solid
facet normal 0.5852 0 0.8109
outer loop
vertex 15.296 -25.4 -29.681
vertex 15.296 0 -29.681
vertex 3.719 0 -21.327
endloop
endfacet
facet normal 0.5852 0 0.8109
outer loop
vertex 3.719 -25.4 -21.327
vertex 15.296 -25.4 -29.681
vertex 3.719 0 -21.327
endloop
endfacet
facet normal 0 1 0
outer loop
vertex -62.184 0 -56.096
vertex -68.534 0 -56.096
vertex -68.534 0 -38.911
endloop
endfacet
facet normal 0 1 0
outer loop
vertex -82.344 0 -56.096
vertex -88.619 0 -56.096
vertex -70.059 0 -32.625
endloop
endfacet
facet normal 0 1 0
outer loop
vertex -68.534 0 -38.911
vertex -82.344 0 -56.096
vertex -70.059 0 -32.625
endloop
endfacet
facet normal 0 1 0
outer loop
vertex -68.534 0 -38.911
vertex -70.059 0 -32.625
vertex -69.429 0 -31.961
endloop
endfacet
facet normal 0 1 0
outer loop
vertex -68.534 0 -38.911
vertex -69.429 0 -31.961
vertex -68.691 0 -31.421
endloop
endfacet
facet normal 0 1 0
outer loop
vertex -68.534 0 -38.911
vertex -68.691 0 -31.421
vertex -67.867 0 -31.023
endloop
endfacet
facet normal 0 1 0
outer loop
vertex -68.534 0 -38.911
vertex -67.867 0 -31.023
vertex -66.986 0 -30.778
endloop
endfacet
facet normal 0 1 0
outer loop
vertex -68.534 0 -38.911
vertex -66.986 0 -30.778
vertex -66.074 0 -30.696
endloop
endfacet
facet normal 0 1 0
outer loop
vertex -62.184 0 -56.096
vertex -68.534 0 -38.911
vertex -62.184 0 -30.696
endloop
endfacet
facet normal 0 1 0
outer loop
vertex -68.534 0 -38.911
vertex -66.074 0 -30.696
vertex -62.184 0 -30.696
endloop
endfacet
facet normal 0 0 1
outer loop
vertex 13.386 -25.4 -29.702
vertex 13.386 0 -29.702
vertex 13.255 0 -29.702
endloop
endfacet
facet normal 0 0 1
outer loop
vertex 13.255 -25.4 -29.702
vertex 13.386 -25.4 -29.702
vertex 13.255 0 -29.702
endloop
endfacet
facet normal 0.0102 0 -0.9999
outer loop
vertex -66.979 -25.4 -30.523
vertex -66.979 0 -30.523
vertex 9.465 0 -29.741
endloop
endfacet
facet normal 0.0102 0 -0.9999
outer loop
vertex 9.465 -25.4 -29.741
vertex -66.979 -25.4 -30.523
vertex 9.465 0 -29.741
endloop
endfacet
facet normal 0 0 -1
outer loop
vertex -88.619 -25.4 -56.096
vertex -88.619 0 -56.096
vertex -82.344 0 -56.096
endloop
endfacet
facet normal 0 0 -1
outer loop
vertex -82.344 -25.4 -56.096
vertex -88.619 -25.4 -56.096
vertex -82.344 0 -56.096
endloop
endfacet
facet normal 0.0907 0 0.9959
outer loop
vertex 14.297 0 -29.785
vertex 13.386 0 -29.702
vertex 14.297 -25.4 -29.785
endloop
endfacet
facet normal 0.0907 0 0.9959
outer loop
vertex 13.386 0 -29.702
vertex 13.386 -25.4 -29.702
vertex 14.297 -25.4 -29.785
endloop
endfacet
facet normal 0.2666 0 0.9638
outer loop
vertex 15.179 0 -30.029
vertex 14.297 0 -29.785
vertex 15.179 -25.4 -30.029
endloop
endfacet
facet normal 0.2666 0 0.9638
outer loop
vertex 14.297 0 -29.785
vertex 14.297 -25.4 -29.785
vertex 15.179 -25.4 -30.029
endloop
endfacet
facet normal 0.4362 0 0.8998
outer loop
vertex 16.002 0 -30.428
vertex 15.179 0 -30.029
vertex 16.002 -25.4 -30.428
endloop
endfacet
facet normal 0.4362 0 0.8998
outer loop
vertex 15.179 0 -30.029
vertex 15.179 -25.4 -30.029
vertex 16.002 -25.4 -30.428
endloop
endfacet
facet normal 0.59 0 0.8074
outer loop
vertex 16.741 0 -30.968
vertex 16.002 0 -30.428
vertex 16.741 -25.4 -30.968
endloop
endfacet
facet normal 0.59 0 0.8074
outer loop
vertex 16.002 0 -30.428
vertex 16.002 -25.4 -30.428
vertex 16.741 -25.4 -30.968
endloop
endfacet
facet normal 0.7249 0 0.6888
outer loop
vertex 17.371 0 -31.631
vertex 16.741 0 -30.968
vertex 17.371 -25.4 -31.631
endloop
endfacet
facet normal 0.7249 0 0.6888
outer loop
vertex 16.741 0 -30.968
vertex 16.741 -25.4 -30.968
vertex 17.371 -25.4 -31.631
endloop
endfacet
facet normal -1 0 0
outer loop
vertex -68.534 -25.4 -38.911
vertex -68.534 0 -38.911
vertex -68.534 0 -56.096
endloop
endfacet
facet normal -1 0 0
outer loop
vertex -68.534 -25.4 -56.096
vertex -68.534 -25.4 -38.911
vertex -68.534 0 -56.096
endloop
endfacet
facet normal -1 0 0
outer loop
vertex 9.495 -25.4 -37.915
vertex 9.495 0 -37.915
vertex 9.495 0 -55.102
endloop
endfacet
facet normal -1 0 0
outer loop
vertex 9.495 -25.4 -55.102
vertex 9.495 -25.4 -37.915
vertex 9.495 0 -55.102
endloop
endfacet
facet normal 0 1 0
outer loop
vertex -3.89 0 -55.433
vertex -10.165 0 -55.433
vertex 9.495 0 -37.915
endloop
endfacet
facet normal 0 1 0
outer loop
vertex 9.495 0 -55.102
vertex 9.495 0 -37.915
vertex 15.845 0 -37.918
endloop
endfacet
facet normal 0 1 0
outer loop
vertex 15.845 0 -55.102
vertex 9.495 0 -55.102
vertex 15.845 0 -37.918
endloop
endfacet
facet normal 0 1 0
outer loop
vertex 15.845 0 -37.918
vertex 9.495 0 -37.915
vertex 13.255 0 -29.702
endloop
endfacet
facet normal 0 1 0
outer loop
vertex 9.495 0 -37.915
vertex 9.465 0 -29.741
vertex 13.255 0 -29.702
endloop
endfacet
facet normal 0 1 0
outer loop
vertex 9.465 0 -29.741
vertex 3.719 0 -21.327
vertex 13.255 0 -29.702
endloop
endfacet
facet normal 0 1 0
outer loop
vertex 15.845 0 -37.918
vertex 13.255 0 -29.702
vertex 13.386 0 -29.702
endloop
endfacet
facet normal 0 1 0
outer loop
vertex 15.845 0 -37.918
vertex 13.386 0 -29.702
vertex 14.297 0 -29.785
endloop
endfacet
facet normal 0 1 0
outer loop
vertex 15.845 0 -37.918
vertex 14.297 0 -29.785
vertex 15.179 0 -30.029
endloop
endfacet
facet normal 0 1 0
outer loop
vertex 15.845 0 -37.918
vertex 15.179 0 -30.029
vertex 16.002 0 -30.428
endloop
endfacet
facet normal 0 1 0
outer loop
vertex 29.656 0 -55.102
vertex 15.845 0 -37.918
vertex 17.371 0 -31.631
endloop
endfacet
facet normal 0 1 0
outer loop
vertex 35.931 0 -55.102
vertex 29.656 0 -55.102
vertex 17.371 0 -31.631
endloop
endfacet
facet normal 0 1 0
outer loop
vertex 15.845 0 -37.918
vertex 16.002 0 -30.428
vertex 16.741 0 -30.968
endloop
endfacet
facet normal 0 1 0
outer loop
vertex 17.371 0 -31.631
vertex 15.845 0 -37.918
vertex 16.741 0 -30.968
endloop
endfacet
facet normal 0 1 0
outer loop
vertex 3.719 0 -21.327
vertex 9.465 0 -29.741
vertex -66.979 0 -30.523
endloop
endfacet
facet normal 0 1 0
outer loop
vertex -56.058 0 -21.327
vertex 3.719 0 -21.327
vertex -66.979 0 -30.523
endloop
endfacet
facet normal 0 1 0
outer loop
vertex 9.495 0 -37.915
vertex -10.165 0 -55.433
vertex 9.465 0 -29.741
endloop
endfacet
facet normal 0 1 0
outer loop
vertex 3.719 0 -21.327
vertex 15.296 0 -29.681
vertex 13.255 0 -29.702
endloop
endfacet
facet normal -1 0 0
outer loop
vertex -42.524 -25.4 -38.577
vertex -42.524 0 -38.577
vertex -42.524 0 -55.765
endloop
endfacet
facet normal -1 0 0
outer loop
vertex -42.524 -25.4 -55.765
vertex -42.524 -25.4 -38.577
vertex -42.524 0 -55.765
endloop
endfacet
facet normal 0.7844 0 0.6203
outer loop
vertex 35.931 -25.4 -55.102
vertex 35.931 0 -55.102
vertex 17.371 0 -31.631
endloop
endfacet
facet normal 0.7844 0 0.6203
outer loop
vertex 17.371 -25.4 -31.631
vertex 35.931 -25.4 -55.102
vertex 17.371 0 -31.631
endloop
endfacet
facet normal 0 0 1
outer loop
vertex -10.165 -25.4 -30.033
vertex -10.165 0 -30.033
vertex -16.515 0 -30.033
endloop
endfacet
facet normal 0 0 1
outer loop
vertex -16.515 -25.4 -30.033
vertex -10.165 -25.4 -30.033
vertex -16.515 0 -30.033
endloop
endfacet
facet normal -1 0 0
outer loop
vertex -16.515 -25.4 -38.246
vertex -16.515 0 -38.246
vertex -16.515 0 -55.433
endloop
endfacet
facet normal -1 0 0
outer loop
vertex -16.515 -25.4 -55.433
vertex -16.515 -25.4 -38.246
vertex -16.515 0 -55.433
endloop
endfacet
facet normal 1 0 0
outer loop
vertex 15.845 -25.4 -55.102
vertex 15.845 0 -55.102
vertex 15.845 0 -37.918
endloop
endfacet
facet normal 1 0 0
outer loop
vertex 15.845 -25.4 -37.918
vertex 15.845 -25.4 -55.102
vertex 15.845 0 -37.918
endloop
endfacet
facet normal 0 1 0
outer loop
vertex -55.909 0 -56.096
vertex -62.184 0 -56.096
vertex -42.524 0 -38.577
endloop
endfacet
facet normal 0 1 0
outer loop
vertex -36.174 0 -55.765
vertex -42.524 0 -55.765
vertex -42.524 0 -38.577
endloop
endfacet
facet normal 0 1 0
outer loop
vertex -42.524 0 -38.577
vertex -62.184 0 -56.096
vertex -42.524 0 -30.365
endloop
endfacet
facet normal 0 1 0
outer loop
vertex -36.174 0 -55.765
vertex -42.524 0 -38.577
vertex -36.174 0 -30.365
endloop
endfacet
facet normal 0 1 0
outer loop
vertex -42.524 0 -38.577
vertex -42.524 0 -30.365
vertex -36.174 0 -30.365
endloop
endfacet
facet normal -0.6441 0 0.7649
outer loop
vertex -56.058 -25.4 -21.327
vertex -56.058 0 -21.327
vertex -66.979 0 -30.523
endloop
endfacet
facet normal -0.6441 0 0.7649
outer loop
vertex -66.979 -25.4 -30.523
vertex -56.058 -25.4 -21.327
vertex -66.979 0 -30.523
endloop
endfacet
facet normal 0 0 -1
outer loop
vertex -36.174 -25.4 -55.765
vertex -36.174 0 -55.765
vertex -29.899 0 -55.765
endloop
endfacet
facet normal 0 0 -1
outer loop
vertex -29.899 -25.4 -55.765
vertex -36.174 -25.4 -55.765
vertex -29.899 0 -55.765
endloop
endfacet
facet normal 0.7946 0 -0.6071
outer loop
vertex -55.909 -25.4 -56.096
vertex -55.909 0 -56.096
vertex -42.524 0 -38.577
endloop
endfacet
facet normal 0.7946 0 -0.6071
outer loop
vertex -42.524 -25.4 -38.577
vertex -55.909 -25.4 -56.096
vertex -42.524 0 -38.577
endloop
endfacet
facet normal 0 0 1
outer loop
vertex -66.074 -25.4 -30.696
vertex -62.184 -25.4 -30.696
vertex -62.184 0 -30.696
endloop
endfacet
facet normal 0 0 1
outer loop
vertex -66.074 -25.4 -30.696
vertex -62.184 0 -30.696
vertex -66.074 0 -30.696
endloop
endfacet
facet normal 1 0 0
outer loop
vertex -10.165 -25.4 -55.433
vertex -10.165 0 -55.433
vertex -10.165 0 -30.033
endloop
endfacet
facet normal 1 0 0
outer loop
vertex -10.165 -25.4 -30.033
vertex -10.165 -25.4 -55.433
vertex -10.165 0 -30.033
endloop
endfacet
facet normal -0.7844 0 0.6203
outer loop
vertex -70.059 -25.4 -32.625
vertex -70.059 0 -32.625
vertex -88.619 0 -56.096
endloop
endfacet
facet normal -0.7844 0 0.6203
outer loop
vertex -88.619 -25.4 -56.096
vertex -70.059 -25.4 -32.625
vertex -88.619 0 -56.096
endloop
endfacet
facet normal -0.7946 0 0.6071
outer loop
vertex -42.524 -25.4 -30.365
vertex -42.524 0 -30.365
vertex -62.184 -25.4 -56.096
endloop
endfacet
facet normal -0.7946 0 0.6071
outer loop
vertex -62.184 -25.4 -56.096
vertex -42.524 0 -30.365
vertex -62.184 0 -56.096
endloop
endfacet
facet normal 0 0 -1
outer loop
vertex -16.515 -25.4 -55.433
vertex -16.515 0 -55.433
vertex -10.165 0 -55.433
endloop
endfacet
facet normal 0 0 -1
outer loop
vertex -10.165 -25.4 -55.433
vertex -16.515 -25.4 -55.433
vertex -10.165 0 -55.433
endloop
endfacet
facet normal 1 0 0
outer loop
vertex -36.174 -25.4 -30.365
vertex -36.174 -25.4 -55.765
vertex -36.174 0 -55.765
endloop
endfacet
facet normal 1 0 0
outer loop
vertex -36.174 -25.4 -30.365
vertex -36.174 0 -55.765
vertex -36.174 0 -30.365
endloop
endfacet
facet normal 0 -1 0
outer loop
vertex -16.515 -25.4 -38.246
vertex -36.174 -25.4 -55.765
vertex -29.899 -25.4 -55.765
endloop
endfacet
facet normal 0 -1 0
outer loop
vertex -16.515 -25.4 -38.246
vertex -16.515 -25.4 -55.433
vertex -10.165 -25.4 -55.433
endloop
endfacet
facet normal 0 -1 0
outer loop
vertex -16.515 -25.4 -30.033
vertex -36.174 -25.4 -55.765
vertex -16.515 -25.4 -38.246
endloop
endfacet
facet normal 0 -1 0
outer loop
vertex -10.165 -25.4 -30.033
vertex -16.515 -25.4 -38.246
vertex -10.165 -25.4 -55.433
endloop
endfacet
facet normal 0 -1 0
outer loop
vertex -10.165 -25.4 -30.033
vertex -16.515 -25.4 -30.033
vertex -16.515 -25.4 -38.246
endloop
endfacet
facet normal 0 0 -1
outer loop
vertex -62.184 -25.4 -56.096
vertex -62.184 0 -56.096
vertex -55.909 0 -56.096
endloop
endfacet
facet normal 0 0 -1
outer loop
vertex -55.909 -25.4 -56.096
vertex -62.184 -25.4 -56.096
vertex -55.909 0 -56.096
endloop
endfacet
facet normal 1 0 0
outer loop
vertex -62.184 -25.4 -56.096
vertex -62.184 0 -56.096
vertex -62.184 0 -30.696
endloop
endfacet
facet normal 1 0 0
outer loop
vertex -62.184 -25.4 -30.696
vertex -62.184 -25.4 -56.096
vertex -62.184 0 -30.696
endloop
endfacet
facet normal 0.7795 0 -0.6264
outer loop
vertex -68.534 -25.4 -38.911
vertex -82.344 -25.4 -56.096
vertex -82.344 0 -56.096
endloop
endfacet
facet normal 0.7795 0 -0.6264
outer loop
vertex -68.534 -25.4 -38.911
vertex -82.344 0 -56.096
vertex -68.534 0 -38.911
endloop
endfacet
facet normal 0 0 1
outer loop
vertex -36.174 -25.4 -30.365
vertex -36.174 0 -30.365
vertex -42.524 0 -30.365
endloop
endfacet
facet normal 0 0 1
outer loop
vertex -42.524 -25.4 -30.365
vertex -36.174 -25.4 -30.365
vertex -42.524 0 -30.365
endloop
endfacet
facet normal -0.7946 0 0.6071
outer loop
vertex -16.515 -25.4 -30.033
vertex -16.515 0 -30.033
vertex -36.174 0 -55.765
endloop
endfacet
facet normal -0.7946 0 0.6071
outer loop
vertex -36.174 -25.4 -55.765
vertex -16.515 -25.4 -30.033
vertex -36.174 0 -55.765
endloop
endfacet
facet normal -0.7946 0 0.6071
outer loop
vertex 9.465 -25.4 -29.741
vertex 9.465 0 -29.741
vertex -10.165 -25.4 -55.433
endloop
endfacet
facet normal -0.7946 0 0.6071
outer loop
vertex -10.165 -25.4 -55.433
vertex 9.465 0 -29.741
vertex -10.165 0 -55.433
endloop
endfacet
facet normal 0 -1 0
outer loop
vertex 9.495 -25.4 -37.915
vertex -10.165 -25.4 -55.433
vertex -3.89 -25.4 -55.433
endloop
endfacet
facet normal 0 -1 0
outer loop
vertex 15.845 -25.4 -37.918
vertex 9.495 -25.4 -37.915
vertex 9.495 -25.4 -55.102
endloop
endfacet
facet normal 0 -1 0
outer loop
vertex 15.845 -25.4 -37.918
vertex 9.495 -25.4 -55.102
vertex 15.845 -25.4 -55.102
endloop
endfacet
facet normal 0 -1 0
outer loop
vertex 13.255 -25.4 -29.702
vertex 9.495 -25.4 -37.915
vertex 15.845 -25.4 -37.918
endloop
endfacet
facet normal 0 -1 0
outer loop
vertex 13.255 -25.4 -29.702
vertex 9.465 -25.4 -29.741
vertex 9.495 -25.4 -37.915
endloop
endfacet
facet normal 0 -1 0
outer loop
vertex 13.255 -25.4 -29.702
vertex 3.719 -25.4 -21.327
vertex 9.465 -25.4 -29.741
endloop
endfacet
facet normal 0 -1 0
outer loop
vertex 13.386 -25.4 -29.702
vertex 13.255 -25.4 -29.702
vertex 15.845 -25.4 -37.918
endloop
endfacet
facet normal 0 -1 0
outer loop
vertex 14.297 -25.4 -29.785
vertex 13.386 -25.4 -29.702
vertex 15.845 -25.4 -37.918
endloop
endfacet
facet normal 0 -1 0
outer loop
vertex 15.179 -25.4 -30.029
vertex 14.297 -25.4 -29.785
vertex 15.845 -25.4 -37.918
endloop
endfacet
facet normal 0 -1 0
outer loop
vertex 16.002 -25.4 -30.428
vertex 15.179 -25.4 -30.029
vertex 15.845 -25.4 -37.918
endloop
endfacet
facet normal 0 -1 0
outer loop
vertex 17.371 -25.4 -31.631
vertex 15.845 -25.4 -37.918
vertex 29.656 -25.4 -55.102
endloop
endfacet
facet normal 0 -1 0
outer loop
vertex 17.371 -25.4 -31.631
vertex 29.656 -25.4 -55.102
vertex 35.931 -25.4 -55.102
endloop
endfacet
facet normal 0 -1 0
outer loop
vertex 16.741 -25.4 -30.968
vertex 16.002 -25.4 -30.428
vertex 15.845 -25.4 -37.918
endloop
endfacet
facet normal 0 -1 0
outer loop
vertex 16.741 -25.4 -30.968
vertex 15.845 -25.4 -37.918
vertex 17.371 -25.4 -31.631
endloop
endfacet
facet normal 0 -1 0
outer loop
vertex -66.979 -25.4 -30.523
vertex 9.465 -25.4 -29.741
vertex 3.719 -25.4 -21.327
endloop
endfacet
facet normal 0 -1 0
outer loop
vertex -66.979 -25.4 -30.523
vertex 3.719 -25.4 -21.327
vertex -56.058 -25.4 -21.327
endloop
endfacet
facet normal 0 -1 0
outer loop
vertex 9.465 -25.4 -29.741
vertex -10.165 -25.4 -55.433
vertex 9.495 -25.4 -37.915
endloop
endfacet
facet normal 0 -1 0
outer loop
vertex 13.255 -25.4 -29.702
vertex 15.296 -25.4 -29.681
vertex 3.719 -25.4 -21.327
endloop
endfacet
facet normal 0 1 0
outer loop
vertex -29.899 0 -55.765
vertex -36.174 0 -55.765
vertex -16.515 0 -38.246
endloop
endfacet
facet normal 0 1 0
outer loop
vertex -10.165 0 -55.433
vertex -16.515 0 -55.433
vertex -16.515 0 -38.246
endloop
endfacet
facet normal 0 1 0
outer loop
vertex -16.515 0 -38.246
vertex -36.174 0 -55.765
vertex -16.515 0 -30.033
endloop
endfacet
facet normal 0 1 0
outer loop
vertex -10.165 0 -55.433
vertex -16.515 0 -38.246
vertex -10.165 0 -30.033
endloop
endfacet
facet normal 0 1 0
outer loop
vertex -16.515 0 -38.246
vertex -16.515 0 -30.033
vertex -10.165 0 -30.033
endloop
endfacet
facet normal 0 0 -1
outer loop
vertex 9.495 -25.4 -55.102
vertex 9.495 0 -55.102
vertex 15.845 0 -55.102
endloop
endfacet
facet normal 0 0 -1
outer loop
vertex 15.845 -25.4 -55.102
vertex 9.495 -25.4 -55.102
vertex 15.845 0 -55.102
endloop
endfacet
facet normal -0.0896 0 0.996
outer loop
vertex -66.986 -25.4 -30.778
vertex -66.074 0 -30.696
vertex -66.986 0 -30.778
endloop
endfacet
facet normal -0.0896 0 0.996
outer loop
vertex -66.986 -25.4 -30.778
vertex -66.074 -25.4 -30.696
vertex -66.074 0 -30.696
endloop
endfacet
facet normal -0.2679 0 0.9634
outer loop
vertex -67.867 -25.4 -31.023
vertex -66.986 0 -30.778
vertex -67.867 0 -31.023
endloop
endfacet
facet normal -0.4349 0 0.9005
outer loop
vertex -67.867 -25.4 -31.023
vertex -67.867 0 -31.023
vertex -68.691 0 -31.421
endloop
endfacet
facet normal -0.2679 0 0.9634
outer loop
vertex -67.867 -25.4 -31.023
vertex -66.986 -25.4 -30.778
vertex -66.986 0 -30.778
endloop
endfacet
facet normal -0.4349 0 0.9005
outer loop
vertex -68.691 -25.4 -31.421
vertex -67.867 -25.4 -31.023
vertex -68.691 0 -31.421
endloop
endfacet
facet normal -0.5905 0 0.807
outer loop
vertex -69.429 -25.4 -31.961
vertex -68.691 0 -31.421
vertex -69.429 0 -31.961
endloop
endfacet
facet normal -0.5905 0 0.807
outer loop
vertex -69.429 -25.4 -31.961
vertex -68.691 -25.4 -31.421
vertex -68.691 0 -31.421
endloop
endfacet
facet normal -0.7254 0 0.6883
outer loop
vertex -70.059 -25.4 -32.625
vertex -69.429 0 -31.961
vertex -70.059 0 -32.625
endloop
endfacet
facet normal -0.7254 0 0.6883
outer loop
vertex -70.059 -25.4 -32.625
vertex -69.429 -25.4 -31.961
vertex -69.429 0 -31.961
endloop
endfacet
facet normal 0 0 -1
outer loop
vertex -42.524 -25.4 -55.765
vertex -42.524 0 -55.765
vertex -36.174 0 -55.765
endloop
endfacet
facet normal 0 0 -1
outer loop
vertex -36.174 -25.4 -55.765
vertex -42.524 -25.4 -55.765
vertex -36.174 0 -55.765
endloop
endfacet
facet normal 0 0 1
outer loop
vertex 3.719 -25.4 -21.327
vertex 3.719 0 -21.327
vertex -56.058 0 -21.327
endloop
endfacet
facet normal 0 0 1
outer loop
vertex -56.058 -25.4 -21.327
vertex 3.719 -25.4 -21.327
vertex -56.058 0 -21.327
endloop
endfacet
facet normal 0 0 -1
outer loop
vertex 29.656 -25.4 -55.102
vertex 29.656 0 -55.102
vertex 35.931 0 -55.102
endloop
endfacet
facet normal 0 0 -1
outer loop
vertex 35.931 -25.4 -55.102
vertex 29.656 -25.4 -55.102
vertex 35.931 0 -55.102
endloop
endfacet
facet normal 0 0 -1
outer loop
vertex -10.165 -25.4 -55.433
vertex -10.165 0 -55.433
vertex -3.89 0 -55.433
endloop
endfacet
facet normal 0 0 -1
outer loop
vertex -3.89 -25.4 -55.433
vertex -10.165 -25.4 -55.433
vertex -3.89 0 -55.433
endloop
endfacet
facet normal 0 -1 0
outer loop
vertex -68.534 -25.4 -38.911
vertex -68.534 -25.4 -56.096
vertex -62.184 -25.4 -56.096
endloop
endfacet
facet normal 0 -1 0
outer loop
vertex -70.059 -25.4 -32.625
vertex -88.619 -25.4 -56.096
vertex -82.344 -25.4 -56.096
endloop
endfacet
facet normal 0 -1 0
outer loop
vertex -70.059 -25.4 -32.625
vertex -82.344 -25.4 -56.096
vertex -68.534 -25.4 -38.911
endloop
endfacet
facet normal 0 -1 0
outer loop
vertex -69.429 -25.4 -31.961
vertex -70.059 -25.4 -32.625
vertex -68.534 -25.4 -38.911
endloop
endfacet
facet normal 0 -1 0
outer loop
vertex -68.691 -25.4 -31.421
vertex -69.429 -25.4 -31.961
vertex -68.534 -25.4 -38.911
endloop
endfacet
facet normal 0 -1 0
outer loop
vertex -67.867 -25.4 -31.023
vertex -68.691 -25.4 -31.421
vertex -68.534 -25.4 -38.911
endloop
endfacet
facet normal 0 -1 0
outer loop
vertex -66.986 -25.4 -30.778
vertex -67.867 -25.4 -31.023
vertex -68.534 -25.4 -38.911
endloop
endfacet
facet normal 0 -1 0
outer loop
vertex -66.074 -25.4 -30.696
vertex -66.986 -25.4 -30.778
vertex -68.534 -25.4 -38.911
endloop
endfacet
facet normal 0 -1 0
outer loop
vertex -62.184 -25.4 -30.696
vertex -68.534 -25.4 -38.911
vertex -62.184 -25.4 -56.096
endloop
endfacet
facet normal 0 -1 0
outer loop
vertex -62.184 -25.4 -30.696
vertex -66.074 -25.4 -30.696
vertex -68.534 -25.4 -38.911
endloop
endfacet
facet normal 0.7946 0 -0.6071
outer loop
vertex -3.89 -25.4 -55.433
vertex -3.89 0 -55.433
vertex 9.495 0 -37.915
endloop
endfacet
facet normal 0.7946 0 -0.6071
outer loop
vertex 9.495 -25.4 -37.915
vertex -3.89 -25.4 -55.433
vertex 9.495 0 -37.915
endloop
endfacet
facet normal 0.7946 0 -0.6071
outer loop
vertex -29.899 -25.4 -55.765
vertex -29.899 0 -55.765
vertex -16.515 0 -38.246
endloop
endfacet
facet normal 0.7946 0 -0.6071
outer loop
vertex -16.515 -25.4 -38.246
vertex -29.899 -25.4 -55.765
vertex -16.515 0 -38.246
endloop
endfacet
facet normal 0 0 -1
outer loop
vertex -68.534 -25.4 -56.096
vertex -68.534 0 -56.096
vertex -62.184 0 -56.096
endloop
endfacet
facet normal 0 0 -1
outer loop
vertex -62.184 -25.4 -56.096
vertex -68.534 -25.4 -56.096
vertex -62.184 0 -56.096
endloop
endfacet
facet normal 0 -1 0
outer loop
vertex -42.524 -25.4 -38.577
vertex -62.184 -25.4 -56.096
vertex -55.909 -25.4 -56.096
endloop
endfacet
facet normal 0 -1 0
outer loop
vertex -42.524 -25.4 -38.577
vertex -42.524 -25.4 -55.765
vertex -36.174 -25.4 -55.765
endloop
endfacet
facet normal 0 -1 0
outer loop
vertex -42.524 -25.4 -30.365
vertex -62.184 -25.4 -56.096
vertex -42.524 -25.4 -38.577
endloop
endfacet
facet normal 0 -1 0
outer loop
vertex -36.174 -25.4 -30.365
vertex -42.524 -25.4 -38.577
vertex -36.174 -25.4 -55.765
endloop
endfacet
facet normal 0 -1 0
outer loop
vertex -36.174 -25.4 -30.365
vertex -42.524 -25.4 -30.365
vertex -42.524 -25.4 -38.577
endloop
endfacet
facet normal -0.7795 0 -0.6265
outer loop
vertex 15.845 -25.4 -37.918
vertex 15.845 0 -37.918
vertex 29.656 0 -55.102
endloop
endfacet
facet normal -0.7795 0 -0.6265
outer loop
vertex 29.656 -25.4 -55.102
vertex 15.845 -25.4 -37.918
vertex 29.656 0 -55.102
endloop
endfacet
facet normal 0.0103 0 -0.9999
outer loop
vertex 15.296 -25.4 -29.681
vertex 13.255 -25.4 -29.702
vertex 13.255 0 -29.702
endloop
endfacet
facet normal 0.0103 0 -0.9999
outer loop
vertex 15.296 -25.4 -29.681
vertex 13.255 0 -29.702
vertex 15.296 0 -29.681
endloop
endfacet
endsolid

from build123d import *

# Parameters (mm, degrees)
F1_DEPTH = 25.4
F2_R     = 5.08
F3_R     = 5.08
F5_DEPTH = 25.4


with BuildPart() as f1:
    # F0 (on Front) → F1 (new body)
    with BuildSketch(Plane.XZ):
        Polygon((9.495087, -29.702337), (-10.164513, -55.433441), (-3.889701, -55.433441), (9.495087, -37.915008), align=None)
        Polygon((-68.533713, -56.095649), (-62.183713, -56.095649), (-62.183713, -30.695649), (-68.533713, -30.695649), (-68.533713, -38.911022), align=None)
        Polygon((35.930644, -55.102337), (15.845087, -29.702337), (15.845087, -37.917711), (29.655832, -55.102337), align=None)
        Polygon((-16.514513, -30.033441), (-36.174113, -55.764545), (-29.899301, -55.764545), (-16.514513, -38.246112), (-16.514513, -35.31459), align=None)
        Polygon((-42.524113, -30.364545), (-62.183713, -56.095649), (-55.908901, -56.095649), (-42.524113, -38.577216), align=None)
        Polygon((-10.164513, -30.033441), (-16.514513, -30.033441), (-16.514513, -35.31459), (-16.514513, -38.246112), (-16.514513, -55.433441), (-10.164513, -55.433441), align=None)
        Polygon((-82.344457, -56.095649), (-68.533713, -38.911022), (-68.533713, -30.695649), (-88.619269, -56.095649), align=None)
        Polygon((-36.174113, -30.364545), (-42.524113, -30.364545), (-42.524113, -38.577216), (-42.524113, -55.764545), (-36.174113, -55.764545), align=None)
        Polygon((15.845087, -29.702337), (9.495087, -29.702337), (9.495087, -37.915008), (9.495087, -55.102337), (15.845087, -55.102337), (15.845087, -37.917711), align=None)
    extrude(amount=F1_DEPTH)

    # F2
    f2_edges = [f1.edges().sort_by_distance(p)[0] for p in [
        (-68.533713, -12.7, -30.695649),
    ]]
    fillet(f2_edges, radius=F2_R)

    # F3
    f3_edges = [f1.edges().sort_by_distance(p)[0] for p in [
        (15.845087, -12.7, -29.702337),
    ]]
    fillet(f3_edges, radius=F3_R)

    # F4 (on Front) → F5 (join)
    with BuildSketch(Plane.XZ):
        Polygon((-56.058383, -21.327179), (-66.978723, -30.523254), (15.296485, -29.681453), (3.719452, -21.327179), align=None)
    extrude(amount=F5_DEPTH)


solid = f1.part
